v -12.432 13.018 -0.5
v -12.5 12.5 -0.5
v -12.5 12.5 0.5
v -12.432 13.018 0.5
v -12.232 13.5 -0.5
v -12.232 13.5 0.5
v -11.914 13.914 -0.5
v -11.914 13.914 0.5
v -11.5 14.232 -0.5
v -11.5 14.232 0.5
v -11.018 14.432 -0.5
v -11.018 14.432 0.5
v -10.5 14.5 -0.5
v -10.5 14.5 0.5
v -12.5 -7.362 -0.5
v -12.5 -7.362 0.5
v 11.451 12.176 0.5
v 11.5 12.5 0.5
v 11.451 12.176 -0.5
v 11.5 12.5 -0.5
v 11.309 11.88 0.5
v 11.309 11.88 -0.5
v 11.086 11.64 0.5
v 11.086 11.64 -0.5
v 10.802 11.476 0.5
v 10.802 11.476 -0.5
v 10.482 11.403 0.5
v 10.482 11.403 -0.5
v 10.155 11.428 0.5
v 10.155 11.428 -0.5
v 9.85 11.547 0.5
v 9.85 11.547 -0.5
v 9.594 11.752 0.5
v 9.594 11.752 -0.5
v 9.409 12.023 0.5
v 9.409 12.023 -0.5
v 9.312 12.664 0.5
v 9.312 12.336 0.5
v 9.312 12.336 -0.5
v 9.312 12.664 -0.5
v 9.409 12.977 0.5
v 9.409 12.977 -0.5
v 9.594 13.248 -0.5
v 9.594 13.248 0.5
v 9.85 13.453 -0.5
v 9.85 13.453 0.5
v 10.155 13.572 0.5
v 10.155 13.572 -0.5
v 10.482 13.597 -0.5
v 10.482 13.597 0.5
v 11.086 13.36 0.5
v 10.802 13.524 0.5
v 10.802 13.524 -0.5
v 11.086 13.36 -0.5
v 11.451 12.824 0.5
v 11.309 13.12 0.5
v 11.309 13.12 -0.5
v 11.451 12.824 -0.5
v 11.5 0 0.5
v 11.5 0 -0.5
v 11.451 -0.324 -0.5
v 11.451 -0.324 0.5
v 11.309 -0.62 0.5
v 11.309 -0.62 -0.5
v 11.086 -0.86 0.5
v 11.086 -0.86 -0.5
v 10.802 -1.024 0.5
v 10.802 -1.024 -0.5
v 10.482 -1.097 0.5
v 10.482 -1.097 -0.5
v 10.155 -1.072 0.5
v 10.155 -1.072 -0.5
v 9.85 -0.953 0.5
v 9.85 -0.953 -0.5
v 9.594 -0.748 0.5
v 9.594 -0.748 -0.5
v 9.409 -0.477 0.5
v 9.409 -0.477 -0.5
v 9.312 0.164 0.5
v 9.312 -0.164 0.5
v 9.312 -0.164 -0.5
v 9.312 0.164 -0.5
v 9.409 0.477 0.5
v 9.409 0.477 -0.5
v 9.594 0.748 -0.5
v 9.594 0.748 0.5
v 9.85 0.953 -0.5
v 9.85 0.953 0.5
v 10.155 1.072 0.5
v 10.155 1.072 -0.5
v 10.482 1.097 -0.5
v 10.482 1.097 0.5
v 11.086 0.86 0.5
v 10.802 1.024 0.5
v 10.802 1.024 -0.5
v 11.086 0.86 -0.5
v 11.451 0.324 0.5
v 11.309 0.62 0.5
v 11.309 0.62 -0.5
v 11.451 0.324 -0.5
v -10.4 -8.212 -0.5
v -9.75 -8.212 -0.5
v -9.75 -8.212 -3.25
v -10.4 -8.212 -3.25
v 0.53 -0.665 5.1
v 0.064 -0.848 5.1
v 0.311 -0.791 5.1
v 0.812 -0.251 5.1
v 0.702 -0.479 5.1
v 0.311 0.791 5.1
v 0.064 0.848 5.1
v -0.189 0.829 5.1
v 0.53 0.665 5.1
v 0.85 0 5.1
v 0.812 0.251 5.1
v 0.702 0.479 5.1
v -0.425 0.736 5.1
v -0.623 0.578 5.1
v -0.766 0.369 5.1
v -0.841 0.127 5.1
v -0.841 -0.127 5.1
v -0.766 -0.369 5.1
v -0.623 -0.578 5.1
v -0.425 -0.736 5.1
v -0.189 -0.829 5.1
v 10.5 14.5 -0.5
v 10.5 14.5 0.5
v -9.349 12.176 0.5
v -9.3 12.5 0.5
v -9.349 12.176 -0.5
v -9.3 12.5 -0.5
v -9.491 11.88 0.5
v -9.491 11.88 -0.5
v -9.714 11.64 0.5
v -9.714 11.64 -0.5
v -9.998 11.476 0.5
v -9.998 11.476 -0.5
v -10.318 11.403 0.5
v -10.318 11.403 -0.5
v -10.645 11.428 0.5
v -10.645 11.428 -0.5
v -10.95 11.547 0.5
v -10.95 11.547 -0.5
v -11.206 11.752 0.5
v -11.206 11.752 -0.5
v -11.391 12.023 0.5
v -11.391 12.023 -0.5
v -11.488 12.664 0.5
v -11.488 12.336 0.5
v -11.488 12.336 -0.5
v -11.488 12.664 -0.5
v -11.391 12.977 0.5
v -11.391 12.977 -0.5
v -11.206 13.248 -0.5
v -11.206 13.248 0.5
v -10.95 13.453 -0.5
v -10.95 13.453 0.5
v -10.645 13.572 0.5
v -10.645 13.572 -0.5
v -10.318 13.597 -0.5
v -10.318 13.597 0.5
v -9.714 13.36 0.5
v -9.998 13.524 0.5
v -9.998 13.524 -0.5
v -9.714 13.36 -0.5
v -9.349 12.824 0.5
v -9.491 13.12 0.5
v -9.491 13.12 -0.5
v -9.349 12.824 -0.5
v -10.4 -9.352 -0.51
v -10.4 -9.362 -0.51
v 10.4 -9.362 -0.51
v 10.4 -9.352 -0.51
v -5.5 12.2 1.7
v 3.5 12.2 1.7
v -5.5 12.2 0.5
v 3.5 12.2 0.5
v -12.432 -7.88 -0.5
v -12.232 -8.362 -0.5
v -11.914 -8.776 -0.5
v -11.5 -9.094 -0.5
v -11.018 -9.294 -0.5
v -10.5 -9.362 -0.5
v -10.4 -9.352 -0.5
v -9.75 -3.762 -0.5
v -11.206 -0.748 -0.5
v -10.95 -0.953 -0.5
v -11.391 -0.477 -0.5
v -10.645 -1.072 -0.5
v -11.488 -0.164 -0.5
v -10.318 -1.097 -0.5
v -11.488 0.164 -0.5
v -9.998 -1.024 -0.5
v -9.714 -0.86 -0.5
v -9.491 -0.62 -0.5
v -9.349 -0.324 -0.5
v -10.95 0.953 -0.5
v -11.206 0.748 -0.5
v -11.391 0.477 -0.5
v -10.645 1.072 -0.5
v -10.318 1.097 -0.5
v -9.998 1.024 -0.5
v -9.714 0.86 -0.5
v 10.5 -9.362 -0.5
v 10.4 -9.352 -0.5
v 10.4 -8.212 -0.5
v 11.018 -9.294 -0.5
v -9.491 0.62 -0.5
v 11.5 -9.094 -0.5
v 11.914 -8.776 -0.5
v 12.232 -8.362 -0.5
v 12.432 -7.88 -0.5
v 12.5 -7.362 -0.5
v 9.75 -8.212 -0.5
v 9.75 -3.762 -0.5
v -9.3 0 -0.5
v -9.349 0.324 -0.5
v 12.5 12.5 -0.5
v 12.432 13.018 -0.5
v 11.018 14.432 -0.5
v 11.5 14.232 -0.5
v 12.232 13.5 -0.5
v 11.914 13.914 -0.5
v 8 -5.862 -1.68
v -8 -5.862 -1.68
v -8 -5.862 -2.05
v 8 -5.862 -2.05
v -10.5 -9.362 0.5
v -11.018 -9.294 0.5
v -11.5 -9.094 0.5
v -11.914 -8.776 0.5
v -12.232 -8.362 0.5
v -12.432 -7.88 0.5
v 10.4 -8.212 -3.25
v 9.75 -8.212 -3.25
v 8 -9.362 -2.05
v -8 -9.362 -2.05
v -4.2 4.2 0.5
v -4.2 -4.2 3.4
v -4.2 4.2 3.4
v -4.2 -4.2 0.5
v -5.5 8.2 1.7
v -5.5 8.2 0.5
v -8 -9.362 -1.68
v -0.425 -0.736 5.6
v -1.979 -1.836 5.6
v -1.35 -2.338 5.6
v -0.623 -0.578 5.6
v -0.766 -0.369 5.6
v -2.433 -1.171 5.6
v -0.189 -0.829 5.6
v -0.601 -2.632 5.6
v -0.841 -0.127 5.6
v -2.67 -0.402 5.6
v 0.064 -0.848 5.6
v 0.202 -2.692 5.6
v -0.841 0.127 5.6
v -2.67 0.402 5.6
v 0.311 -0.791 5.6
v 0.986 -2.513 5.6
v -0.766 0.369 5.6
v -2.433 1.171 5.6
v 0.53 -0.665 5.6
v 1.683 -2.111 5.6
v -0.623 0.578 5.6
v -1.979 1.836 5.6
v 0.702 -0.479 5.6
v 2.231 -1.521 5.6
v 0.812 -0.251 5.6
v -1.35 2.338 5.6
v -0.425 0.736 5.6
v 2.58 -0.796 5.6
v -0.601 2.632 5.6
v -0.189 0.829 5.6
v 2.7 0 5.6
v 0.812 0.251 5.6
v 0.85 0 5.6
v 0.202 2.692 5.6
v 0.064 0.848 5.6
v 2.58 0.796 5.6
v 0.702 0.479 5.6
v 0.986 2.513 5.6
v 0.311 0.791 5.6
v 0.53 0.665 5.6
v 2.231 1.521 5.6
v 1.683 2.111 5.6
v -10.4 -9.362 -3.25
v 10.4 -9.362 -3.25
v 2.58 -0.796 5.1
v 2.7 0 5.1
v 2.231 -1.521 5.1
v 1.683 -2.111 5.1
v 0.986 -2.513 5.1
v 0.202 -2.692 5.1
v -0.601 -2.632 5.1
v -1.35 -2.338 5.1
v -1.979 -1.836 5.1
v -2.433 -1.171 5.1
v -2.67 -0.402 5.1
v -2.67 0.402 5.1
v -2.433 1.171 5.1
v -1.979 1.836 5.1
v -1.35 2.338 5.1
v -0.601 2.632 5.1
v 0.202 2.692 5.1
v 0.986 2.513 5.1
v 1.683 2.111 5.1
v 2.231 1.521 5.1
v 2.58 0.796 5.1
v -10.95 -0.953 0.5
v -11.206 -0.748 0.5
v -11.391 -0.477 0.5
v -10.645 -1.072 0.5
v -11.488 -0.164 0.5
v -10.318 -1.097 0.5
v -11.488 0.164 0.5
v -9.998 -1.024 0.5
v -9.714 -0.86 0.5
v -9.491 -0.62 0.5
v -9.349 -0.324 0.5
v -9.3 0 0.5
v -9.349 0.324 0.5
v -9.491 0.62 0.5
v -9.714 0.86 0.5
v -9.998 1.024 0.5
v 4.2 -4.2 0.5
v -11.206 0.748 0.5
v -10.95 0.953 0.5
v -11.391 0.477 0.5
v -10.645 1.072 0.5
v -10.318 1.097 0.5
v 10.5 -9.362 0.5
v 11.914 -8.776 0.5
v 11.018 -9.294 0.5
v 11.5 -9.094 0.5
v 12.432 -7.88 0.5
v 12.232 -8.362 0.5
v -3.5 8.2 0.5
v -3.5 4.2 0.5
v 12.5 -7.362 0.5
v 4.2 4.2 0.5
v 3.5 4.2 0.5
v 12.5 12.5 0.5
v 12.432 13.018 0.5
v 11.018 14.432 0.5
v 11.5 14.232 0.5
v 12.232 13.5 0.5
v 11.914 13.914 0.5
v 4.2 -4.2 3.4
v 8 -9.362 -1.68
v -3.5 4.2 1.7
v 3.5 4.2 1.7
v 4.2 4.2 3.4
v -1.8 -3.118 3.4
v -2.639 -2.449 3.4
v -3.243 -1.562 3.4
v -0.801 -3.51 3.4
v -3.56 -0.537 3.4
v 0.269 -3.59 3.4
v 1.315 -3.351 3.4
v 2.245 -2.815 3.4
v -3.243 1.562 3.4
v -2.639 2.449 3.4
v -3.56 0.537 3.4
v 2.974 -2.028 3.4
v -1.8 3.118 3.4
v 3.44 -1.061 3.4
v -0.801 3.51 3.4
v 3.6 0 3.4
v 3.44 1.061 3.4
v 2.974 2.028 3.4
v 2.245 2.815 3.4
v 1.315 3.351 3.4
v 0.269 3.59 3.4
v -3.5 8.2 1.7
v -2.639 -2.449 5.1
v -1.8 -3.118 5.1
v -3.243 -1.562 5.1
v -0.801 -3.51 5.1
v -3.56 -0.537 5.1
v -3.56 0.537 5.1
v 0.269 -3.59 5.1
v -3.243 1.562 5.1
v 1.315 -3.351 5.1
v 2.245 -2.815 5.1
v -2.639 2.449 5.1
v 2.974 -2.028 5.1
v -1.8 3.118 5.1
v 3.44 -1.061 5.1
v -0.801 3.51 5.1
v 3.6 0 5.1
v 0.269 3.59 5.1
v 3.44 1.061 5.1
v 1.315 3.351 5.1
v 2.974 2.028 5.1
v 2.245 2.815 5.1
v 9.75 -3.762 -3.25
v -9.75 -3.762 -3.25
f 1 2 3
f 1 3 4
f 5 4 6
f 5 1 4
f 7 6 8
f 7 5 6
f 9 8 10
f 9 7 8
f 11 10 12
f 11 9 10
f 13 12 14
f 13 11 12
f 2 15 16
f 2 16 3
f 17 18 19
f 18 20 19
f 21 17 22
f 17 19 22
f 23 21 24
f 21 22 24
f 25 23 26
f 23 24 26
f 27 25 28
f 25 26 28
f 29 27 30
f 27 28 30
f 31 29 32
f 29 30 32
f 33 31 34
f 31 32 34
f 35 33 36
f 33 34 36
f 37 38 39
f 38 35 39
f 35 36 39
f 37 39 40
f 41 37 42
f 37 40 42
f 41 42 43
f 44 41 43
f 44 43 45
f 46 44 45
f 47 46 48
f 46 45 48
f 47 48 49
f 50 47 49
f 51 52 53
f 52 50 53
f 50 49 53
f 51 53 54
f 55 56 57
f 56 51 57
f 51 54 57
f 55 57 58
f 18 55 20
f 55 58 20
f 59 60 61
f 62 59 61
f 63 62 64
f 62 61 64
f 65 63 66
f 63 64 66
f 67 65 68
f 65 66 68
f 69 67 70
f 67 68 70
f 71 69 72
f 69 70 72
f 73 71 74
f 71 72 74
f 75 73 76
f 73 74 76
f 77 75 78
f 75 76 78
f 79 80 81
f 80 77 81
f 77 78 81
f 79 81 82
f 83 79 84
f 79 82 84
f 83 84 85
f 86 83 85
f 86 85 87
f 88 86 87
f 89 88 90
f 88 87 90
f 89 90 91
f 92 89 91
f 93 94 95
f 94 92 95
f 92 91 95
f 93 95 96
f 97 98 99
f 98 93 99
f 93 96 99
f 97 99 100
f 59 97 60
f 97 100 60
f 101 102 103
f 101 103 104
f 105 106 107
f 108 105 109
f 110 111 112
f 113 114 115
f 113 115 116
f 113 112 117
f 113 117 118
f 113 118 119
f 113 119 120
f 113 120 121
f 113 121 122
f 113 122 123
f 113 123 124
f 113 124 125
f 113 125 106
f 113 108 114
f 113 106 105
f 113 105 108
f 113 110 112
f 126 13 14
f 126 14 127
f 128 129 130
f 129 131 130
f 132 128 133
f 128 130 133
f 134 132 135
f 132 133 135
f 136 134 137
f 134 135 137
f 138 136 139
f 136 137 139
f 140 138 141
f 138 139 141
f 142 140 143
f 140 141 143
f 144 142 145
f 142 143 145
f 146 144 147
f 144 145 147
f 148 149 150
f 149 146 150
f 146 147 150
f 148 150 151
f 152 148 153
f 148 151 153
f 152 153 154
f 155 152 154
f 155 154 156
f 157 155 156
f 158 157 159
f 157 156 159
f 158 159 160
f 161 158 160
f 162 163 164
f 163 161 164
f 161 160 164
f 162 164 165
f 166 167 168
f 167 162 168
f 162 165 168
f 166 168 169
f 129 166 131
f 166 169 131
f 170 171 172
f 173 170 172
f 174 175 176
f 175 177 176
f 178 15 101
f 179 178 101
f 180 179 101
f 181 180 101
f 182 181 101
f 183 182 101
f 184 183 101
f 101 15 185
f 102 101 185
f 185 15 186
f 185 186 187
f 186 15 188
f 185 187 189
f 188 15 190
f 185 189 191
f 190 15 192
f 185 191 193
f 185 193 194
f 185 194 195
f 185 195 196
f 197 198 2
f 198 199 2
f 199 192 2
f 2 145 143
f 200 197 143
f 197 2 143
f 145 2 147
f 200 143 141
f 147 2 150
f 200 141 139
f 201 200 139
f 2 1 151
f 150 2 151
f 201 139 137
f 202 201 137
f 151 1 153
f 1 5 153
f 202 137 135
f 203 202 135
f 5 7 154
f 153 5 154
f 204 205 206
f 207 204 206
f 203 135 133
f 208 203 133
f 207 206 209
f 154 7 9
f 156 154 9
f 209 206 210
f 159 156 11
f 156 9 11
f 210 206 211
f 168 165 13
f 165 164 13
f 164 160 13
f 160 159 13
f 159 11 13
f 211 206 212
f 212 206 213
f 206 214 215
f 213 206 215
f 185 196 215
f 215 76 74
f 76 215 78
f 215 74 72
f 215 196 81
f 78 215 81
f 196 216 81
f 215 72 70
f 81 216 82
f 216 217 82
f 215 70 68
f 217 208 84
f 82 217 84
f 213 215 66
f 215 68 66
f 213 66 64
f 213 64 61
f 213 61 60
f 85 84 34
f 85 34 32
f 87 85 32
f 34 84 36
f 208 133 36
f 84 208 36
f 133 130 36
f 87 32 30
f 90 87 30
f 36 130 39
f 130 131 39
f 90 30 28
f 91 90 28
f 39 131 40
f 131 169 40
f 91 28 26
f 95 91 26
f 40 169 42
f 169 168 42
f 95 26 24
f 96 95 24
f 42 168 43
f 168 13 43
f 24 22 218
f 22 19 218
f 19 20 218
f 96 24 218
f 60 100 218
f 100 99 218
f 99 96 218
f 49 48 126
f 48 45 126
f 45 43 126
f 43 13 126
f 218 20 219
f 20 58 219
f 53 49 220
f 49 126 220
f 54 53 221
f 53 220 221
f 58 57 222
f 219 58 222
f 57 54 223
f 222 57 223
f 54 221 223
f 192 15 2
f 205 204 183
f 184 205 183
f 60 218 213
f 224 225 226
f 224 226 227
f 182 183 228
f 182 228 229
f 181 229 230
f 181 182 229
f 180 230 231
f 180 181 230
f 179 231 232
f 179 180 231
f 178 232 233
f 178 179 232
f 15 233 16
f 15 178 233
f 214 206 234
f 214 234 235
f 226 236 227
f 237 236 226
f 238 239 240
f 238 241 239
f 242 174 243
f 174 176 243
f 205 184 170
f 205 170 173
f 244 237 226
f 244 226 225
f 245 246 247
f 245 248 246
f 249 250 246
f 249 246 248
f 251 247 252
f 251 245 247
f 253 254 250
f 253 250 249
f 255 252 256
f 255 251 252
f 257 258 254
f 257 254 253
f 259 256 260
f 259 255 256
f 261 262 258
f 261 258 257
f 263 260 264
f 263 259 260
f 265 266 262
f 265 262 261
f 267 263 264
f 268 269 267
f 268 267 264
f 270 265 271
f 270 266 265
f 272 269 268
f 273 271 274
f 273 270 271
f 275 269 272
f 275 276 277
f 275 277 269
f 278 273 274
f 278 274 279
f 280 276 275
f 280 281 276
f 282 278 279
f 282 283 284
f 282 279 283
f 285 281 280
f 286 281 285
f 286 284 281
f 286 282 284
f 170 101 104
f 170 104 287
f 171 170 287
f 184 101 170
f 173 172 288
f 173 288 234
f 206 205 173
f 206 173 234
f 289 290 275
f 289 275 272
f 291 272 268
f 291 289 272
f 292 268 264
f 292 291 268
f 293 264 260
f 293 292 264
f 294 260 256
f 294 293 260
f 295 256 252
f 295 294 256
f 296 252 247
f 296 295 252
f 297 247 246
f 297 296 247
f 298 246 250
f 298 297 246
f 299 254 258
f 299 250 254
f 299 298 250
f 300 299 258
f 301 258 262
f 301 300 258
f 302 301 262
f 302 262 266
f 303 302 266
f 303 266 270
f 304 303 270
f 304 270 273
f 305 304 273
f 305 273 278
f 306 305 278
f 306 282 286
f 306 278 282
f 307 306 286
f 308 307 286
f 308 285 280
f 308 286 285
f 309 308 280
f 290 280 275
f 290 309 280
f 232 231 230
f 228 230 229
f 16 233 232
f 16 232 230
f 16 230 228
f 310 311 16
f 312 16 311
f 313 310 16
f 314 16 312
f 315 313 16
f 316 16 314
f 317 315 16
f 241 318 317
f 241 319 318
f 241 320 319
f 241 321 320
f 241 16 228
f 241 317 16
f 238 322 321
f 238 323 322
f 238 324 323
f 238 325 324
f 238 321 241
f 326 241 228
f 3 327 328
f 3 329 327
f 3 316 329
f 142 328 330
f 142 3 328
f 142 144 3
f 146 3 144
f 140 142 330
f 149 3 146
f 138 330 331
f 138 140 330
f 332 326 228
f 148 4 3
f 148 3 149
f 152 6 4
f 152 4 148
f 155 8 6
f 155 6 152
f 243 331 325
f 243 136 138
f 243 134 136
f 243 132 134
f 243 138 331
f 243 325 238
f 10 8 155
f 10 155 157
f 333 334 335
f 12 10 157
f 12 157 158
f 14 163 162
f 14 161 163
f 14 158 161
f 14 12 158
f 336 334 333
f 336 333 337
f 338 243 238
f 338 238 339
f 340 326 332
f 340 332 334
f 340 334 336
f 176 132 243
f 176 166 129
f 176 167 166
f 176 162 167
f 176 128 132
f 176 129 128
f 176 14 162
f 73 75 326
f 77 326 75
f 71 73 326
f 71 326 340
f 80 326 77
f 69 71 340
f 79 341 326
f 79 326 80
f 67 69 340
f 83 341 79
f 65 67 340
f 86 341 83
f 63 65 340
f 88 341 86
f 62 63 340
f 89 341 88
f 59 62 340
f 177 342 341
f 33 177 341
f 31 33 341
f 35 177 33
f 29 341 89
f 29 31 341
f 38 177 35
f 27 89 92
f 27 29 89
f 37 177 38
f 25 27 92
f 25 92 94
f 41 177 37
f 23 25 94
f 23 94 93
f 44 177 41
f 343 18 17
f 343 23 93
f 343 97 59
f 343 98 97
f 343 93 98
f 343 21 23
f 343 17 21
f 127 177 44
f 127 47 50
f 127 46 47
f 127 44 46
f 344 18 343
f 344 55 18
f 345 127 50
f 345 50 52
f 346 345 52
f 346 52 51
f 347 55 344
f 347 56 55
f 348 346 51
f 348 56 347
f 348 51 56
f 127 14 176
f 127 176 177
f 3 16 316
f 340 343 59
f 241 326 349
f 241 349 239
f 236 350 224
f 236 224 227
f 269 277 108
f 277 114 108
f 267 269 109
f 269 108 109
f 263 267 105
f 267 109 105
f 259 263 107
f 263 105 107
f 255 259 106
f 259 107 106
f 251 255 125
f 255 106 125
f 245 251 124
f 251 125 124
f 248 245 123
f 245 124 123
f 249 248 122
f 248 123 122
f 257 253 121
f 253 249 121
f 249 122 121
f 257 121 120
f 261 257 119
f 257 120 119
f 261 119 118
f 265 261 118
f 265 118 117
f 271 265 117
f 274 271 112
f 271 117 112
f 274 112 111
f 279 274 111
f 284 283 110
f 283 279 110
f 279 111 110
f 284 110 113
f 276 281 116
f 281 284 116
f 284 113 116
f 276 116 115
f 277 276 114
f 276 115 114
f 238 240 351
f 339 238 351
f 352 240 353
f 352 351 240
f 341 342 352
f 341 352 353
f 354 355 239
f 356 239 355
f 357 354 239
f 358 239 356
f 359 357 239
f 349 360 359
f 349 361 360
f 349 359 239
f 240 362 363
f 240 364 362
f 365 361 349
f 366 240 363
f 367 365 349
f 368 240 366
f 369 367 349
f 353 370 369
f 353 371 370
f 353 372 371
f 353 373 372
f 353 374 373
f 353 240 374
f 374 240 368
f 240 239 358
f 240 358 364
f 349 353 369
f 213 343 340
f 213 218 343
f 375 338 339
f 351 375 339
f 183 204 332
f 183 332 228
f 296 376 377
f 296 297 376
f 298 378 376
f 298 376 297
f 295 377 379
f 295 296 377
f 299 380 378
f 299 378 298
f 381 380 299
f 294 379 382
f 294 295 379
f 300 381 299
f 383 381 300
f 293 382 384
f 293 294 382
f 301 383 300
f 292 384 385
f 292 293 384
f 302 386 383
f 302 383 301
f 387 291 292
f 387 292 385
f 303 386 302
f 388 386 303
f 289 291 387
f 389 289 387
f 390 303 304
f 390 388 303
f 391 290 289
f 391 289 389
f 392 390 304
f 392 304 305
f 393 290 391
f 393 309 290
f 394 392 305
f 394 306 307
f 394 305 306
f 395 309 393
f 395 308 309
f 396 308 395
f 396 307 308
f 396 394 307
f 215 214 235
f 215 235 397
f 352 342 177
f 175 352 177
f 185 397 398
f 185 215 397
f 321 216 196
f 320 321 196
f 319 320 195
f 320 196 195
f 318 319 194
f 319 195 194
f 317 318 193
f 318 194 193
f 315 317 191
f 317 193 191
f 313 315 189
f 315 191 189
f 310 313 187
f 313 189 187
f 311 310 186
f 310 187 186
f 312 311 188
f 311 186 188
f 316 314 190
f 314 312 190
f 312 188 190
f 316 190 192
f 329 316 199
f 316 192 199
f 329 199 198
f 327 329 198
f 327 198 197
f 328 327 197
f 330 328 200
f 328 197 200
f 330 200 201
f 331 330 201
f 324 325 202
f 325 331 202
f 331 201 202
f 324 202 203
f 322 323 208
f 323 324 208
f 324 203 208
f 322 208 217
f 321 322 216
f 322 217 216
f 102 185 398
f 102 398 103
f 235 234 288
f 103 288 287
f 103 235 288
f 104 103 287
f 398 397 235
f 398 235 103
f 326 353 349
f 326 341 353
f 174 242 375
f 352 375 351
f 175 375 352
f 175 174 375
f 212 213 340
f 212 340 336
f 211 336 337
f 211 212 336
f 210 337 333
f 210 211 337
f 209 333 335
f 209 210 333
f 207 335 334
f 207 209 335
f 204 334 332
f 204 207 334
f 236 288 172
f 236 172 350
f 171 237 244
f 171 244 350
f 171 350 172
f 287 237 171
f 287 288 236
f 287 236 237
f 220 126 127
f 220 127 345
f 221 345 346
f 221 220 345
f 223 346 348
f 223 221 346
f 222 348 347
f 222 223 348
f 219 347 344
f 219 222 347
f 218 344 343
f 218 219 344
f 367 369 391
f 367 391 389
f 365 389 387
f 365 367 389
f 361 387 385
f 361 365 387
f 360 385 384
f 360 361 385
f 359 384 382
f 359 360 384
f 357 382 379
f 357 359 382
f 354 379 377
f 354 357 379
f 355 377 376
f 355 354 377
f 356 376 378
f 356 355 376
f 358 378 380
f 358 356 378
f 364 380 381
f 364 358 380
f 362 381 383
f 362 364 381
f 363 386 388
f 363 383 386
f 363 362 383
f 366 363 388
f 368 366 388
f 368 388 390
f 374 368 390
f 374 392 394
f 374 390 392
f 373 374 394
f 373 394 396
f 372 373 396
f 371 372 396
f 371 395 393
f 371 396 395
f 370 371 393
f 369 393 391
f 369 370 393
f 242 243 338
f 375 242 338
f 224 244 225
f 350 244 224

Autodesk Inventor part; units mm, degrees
ref_plane "YZ Plane" through (0, 0, 0) normal (1, 0, 0) x (0, 1, 0)
ref_plane "XZ Plane" through (0, 0, 0) normal (0, 1, 0) x (-1, 0, 0)
ref_plane "XY Plane" through (0, 0, 0) normal (0, 0, 1) x (1, 0, 0)
sketch "Skizze1" plane through (0, 0, 0) normal (0, 0, 1) x (1, 0, 0)
  line L0 (-10.5, 14.5) -> (10.5, 14.5)
  line L1 (12.5, 12.5) -> (12.5, -7.362)
  line L2 (10.5, -9.362) -> (-10.5, -9.362)
  line L3 (-12.5, -7.362) -> (-12.5, 12.5)
  line L4 (-10.4, 12.5) -> (10.4, 12.5) construction
  line L5 (10.4, 12.5) -> (10.4, 0) construction
  line L6 (10.4, 0) -> (-10.4, 0) construction
  line L7 (-10.4, 0) -> (-10.4, 12.5) construction
  circle A0 centre (-10.4, 12.5) radius 1.1
  circle A1 centre (10.4, 12.5) radius 1.1
  circle A2 centre (-10.4, 0) radius 1.1
  circle A3 centre (10.4, 0) radius 1.1
  arc A4 (-10.5, 14.5) -> (-12.5, 12.5) centre (-10.5, 12.5) ccw
  arc A5 (12.5, 12.5) -> (10.5, 14.5) centre (10.5, 12.5) ccw
  arc A6 (10.5, -9.362) -> (12.5, -7.362) centre (10.5, -7.362) ccw
  arc A7 (-12.5, -7.362) -> (-10.5, -9.362) centre (-10.5, -7.362) ccw
  line L8 (0, -9.362) -> (0, 0) construction
  point P0 (-12.5, 14.5)
  point P1 (12.5, -9.362)
  point P2 (-12.5, -9.362)
  dimension "d0" = 25
  dimension "d1" = 23.862
  dimension "d2" = 2.2
  dimension "d3" = 2
  dimension "d4" = 20.8
  dimension "d5" = 12.5
  dimension "d6" = 2
extrude "Extrusion1" add sketch "Skizze1" along normal mid plane 1
sketch "Skizze2" plane through (0, 0, 0.5) normal (0, 0, 1) x (1, 0, 0)
  line L0 (-4.2, 4.2) -> (4.2, 4.2)
  line L1 (4.2, 4.2) -> (4.2, -4.2)
  line L2 (4.2, -4.2) -> (-4.2, -4.2)
  line L3 (-4.2, -4.2) -> (-4.2, 4.2)
  line L4 (-4.2, -4.2) -> (4.2, 4.2) construction
  point P0 (0, 0)
  point P1 (0, 0)
  dimension "d9" = 8.4
extrude "Extrusion2" add sketch "Skizze2" along normal blind 2.9
sketch "Skizze3" plane through (0, 0, 3.4) normal (0, 0, 1) x (1, 0, 0)
  circle A0 centre (0, 0) radius 3.6
  dimension "d12" = 7.2
extrude "Extrusion3" add sketch "Skizze3" along normal blind 1.7
sketch "Skizze4" plane through (0, 0, 5.1) normal (0, 0, 1) x (1, 0, 0)
  circle A0 centre (0, 0) radius 2.7
  circle A1 centre (0, 0) radius 0.85
  dimension "d15" = 5.4
  dimension "d16" = 1.7
extrude "Extrusion4" add sketch "Skizze4" along normal blind 0.5
sketch "Skizze5" plane through (0, 0, 0.5) normal (0, 0, 1) x (1, 0, 0)
  point P0 (0, 0)
sketch "Skizze6" plane through (0, 0, 0.5) normal (0, 0, 1) x (1, 0, 0)
  line L0 (4.2, 4.2) -> (-4.2, 4.2) projected
  line L1 (-3.5, 4.2) -> (3.5, 4.2)
  line L2 (3.5, 4.2) -> (3.5, 12.2)
  line L3 (3.5, 12.2) -> (-2.9111, 12.2)
  line L4 (-2.9111, 12.2) -> (-5.5, 12.2)
  line L5 (-5.5, 12.2) -> (-5.5, 8.2)
  line L6 (-5.5, 8.2) -> (-3.5, 8.2)
  line L7 (-3.5, 8.2) -> (-3.5, 4.2)
  point P0 (0, 0)
  point P1 (0, 4.2)
  dimension "d19" = 9
  dimension "d20" = 7
  dimension "d21" = 4
  dimension "d22" = 8
extrude "Extrusion5" add sketch "Skizze6" along normal blind 1.2
sketch "Skizze7" plane through (0, 0, -0.5) normal (0, 0, -1) x (-1, 0, 0)
  line L0 (-10.5, -9.362) -> (10.5, -9.362) projected
  line L1 (10.5, -9.362) -> (-10.5, -9.362) projected
  line L2 (10.4, -9.362) -> (-10.4, -9.362)
  line L3 (-10.4, -9.362) -> (-10.4, -8.212)
  line L4 (-10.4, -8.212) -> (10.4, -8.212)
  line L5 (10.4, -8.212) -> (10.4, -9.362)
  line L6 (9.75, -8.212) -> (-9.75, -8.212)
  line L7 (-9.75, -8.212) -> (-9.75, -3.762)
  line L8 (-9.75, -3.762) -> (9.75, -3.762)
  line L9 (9.75, -3.762) -> (9.75, -8.212)
  point P0 (0, 0)
  point P1 (0, -9.362)
  point P2 (0, -8.212)
  dimension "d25" = 20.8
  dimension "d26" = 1.15
  dimension "d27" = 19.5
  dimension "d28" = 5.6
extrude "Extrusion6" add sketch "Skizze7" along normal blind 2.75
sketch "Skizze8" plane through (-10.5, -9.362, 0.5) normal (0, -1, 0) x (1, 0, 0)
  line L0 (21, 0) -> (21, -1) projected
  line L1 (0, 0) -> (21, 0) projected
  line L2 (0, 0) -> (0, -1) projected
  line L3 (0.1, -1) -> (0, -1) projected
  line L4 (0.1, -1) -> (0.1, -3.75) projected
  line L5 (20.9, -3.75) -> (0.1, -3.75) projected
  line L6 (20.9, -1) -> (20.9, -3.75) projected
  line L7 (21, -1) -> (20.9, -1) projected
  line L8 (2.5, -2.18) -> (18.5, -2.18)
  line L9 (18.5, -2.18) -> (18.5, -2.55)
  line L10 (18.5, -2.55) -> (2.5, -2.55)
  line L11 (2.5, -2.55) -> (2.5, -2.18)
  line L12 (0.75, -3.75) -> (20.25, -3.75) construction
  line L13 (10.5, -3.75) -> (10.5, -2.55) construction
  line L14 (20.9, -3.75) -> (0.1, -3.75) construction
  point P0 (10.5, -0.5)
  dimension "d31" = 1.2
  dimension "d32" = 0.37
  dimension "d33" = 16
extrude "Extrusion7" cut sketch "Skizze8" against normal blind 3.5 contours L8 L9 L10 L11
ref_plane "SMD component height" through (0, 0, -1.7) normal (0, 0, -1) x (-1, 0, 0)
sketch "Skizze10" plane through (0, 0, -0.5) normal (0, 0, -1) x (-1, 0, 0)
  line L0 (12.5079, -9.362) -> (-12.5079, -9.362) construction
  line L1 (-12.5079, -9.362) -> (-12.5079, 14.5) construction
  line L2 (-12.5079, 14.5) -> (12.5079, 14.5) construction
  line L3 (12.5079, 14.5) -> (12.5079, -9.362) construction
  line L4 (10.5, 14.5) -> (-10.5, 14.5) projected
  line L5 (-10.4, -9.362) -> (10.4, -9.362) projected
  point P0 (0, 0)
  point P1 (0, 14.5)
  point P2 (0, -9.362)
decal "Aufkleber1"
sketch "Skizze11" plane through (0, 0, -3.25) normal (0, 0, -1) x (-1, 0, 0)
  line L0 (10.5, 14.5) -> (-10.5, 14.5) projected
  line L1 (12.5079, -9.362) -> (-12.5079, -9.362) construction
  line L2 (-12.5079, -9.362) -> (-12.5079, 14.5) construction
  line L3 (-12.5079, 14.5) -> (12.5079, 14.5) construction
  line L4 (12.5079, 14.5) -> (12.5079, -9.362) construction
  line L5 (-10.4, -9.362) -> (10.4, -9.362) projected
  point P0 (0, 0)
  point P1 (0, -9.362)
  point P2 (0, 14.5)
decal "Aufkleber2"
sketch "Skizze12" plane through (-10.5, -9.362, 0.5) normal (0, -1, 0) x (1, 0, 0)
  line L0 (20.9, -1) -> (20.9, -3.75) projected
  line L1 (0.1, -1) -> (0.1, -3.75) projected
  line L2 (20.9, -1) -> (0.1, -1)
  line L3 (0.1, -1) -> (0.1, -1.01)
  line L4 (0.1, -1.01) -> (20.9, -1.01)
  line L5 (20.9, -1.01) -> (20.9, -1)
  point P0 (10.5, -0.5)
  dimension "d58" = 0.01
extrude "Extrusion9" cut sketch "Skizze12" against normal blind 0.01
properties part number "Raspberry Camera V2.1"
